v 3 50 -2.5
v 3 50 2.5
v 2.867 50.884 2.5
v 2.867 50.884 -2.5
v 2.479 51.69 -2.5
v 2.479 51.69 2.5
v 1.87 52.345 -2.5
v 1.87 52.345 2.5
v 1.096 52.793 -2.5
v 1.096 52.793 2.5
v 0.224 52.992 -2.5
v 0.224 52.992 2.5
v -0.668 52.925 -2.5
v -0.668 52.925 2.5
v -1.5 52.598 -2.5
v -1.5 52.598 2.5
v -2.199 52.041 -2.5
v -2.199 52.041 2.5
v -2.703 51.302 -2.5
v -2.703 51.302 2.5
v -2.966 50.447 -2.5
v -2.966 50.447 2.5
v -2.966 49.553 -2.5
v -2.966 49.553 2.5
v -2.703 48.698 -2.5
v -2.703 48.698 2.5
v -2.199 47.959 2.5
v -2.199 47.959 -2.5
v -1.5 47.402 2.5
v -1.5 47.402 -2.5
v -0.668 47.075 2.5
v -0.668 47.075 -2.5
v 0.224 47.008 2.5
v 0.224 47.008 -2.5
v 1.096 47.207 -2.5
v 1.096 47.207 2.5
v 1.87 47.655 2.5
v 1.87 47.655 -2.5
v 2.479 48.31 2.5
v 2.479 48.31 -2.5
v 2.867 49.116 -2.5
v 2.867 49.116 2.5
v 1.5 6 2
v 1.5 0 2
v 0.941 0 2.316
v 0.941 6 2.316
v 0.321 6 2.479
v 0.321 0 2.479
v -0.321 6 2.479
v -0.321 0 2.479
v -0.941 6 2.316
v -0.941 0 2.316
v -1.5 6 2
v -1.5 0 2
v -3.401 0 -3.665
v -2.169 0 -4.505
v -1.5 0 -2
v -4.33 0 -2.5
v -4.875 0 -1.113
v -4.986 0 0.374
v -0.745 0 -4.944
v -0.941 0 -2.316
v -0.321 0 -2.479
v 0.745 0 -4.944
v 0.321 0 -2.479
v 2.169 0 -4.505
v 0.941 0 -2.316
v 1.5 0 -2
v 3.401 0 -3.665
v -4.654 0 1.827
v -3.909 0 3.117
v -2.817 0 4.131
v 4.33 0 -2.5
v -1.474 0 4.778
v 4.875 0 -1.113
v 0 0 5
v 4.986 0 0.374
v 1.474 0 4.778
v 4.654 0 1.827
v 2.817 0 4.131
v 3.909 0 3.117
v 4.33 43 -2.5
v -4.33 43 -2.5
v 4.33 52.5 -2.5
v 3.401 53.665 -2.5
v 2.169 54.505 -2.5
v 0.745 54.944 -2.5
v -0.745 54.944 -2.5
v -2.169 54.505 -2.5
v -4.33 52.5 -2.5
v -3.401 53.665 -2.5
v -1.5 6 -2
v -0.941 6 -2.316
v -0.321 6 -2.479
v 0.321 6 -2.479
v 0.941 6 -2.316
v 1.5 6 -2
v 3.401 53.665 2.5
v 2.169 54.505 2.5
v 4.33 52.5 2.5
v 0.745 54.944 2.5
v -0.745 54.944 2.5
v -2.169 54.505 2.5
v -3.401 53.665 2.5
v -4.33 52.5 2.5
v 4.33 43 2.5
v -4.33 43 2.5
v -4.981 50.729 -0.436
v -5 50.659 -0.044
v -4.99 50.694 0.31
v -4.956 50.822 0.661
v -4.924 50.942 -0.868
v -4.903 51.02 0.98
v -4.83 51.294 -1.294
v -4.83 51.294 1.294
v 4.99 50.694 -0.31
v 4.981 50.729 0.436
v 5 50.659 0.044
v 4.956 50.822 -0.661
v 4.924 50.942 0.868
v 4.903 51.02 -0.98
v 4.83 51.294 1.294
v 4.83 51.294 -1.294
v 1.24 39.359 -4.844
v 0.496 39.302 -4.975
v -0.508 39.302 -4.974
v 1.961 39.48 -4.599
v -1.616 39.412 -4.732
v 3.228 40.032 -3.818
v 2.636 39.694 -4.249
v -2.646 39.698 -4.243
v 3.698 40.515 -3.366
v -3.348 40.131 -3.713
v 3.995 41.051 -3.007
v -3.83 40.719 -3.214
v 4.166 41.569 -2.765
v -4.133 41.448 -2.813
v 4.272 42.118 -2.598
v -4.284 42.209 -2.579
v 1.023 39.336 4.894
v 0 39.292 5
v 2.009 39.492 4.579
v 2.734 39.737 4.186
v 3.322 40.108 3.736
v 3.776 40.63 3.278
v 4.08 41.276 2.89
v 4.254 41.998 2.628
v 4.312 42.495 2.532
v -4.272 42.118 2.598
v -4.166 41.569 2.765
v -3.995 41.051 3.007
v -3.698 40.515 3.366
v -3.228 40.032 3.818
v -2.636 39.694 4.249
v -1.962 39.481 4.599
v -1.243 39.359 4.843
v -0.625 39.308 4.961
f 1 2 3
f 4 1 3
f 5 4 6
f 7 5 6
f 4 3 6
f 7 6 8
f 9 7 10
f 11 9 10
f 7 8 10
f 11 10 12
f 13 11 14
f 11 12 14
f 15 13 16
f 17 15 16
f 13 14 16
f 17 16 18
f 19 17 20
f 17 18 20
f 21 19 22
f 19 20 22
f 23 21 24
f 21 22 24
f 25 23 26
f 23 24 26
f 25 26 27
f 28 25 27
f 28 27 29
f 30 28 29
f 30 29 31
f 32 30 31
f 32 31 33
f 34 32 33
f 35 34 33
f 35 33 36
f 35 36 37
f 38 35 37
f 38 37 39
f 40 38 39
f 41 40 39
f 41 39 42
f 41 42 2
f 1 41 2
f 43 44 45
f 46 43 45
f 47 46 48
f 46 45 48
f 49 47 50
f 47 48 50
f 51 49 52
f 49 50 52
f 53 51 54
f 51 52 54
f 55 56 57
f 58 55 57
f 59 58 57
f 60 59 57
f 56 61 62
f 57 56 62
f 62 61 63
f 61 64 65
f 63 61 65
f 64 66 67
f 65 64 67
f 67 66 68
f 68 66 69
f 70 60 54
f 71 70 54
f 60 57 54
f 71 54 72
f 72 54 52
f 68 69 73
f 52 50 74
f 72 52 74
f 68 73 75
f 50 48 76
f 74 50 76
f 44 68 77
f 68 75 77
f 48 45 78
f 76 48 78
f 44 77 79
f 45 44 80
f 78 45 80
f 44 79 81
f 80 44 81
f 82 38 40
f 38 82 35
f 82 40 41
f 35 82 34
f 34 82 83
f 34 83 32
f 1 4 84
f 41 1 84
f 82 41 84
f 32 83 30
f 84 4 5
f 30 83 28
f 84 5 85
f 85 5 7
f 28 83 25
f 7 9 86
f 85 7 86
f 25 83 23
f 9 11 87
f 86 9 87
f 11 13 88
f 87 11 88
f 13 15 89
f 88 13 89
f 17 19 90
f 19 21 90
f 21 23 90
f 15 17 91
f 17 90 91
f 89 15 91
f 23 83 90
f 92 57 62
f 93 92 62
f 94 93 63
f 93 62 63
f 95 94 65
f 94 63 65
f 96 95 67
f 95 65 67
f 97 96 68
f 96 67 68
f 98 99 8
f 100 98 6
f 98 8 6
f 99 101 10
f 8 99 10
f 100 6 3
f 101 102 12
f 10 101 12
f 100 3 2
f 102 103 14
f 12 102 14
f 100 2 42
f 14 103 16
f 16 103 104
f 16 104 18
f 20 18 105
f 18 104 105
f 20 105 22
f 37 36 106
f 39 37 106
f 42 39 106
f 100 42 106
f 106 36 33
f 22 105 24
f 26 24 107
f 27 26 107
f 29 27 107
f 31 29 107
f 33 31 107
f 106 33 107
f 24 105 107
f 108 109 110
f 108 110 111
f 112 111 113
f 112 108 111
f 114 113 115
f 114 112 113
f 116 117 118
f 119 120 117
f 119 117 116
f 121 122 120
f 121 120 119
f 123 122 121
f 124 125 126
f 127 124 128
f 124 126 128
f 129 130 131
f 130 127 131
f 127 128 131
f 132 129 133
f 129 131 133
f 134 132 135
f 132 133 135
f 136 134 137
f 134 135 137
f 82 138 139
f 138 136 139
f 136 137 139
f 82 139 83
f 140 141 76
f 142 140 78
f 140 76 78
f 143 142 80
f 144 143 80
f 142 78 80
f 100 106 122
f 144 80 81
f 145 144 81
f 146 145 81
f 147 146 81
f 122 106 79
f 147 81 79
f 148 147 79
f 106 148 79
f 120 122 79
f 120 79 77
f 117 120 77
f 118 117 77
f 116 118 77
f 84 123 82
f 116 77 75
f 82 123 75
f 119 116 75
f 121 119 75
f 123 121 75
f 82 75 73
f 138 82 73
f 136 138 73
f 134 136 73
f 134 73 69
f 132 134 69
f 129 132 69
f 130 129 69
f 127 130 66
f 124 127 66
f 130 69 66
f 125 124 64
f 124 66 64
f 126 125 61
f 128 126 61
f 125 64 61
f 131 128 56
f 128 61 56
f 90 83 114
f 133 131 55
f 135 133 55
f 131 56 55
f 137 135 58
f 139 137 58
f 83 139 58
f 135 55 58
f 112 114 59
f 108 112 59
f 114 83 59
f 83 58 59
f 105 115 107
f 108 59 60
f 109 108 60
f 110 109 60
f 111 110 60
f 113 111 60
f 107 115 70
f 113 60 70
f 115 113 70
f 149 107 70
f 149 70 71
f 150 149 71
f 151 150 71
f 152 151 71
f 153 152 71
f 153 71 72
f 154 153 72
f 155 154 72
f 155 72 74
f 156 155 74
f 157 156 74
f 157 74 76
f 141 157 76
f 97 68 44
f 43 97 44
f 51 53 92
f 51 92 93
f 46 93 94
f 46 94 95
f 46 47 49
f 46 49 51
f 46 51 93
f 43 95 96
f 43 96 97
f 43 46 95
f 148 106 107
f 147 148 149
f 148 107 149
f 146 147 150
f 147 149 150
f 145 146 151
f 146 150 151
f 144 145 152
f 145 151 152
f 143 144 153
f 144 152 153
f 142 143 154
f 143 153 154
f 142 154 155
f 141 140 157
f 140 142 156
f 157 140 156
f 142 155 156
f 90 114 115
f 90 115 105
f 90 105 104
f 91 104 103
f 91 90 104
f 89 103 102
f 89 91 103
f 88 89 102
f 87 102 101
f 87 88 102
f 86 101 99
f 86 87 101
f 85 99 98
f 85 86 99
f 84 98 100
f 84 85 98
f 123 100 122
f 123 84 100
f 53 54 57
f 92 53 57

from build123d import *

# Parameters (mm, degrees)
SKETCH1_R               = 5
BOSS_EXTRUDE1_DEPTH     = 55
CUT_EXTRUDE2_DEPTH      = 56.452682532
CUT_EXTRUDE2_DEPTH_BACK = 56.452682532
SKETCH6_R               = 3
CUT_EXTRUDE3_DEPTH      = 56.733742145
CUT_EXTRUDE4_DEPTH      = 56.733742145
CUT_EXTRUDE5_DEPTH      = 6


with BuildPart() as part:
    # Sketch1 → Boss-Extrude1 (new body)
    with BuildSketch(Plane(origin=(0, 0, 0), x_dir=(1, 0, 0), z_dir=(0, 1, 0))):
        with Locations(Location((0, 0, 0), (0, 0, 270))):
            Circle(SKETCH1_R)
    extrude(amount=BOSS_EXTRUDE1_DEPTH)

    # Sketch5 → Cut-Extrude2 (cut, two sides: drawn at the far end of the back side and taken through both)
    with BuildSketch(Plane(origin=(0, 0, 0), x_dir=(0, 0, -1), z_dir=(1, 0, 0)).offset(-CUT_EXTRUDE2_DEPTH_BACK)):
        with BuildLine():
            Line((-2.5, 55), (-2.5, 43))
            ThreePointArc((-2.5, 43), (-3.671572875, 40.171572875), (-6.5, 39))
            Line((-6.5, 39), (-6.5, 55))
            Line((-6.5, 55), (-2.5, 55))
        make_face()
        with BuildLine():
            Line((6.5, 55), (6.5, 39))
            ThreePointArc((6.5, 39), (3.671572875, 40.171572875), (2.5, 43))
            Line((2.5, 43), (2.5, 55))
            Line((2.5, 55), (6.5, 55))
        make_face()
    extrude(amount=CUT_EXTRUDE2_DEPTH + CUT_EXTRUDE2_DEPTH_BACK, mode=Mode.SUBTRACT)

    # Sketch6 → Cut-Extrude3 (cut, through all)
    with BuildSketch(Plane.XY.offset(2.5)):
        with Locations((0, 50)):
            Circle(SKETCH6_R)
    extrude(amount=-CUT_EXTRUDE3_DEPTH, mode=Mode.SUBTRACT)

    # Sketch7 → Cut-Extrude4 (cut, through all)
    with BuildSketch(Plane(origin=(0, 0, -2.5), x_dir=(-1, 0, 0), z_dir=(0, 0, -1))):
        with BuildLine():
            Line((-4.829629131, 51.294095226), (-10.892994719, 28.665306789))
            Line((-10.892994719, 28.665306789), (-10.892994719, 70.083373649))
            Line((-10.892994719, 70.083373649), (10.892994719, 70.083373649))
            Line((10.892994719, 70.083373649), (10.892994719, 28.665306789))
            Line((10.892994719, 28.665306789), (4.829629131, 51.294095226))
            ThreePointArc((4.829629131, 51.294095226), (0, 55), (-4.829629131, 51.294095226))
        make_face()
    extrude(amount=-CUT_EXTRUDE4_DEPTH, mode=Mode.SUBTRACT)

    # Sketch8 → Cut-Extrude5 (cut)
    with BuildSketch(Plane.XZ):
        with BuildLine():
            Line((-1.5, 2), (-1.5, -2))
            ThreePointArc((-1.5, -2), (0, -2.5), (1.5, -2))
            Line((1.5, -2), (1.5, 2))
            ThreePointArc((1.5, 2), (0, 2.5), (-1.5, 2))
        make_face()
    extrude(amount=-CUT_EXTRUDE5_DEPTH, mode=Mode.SUBTRACT)


solid = part.part
